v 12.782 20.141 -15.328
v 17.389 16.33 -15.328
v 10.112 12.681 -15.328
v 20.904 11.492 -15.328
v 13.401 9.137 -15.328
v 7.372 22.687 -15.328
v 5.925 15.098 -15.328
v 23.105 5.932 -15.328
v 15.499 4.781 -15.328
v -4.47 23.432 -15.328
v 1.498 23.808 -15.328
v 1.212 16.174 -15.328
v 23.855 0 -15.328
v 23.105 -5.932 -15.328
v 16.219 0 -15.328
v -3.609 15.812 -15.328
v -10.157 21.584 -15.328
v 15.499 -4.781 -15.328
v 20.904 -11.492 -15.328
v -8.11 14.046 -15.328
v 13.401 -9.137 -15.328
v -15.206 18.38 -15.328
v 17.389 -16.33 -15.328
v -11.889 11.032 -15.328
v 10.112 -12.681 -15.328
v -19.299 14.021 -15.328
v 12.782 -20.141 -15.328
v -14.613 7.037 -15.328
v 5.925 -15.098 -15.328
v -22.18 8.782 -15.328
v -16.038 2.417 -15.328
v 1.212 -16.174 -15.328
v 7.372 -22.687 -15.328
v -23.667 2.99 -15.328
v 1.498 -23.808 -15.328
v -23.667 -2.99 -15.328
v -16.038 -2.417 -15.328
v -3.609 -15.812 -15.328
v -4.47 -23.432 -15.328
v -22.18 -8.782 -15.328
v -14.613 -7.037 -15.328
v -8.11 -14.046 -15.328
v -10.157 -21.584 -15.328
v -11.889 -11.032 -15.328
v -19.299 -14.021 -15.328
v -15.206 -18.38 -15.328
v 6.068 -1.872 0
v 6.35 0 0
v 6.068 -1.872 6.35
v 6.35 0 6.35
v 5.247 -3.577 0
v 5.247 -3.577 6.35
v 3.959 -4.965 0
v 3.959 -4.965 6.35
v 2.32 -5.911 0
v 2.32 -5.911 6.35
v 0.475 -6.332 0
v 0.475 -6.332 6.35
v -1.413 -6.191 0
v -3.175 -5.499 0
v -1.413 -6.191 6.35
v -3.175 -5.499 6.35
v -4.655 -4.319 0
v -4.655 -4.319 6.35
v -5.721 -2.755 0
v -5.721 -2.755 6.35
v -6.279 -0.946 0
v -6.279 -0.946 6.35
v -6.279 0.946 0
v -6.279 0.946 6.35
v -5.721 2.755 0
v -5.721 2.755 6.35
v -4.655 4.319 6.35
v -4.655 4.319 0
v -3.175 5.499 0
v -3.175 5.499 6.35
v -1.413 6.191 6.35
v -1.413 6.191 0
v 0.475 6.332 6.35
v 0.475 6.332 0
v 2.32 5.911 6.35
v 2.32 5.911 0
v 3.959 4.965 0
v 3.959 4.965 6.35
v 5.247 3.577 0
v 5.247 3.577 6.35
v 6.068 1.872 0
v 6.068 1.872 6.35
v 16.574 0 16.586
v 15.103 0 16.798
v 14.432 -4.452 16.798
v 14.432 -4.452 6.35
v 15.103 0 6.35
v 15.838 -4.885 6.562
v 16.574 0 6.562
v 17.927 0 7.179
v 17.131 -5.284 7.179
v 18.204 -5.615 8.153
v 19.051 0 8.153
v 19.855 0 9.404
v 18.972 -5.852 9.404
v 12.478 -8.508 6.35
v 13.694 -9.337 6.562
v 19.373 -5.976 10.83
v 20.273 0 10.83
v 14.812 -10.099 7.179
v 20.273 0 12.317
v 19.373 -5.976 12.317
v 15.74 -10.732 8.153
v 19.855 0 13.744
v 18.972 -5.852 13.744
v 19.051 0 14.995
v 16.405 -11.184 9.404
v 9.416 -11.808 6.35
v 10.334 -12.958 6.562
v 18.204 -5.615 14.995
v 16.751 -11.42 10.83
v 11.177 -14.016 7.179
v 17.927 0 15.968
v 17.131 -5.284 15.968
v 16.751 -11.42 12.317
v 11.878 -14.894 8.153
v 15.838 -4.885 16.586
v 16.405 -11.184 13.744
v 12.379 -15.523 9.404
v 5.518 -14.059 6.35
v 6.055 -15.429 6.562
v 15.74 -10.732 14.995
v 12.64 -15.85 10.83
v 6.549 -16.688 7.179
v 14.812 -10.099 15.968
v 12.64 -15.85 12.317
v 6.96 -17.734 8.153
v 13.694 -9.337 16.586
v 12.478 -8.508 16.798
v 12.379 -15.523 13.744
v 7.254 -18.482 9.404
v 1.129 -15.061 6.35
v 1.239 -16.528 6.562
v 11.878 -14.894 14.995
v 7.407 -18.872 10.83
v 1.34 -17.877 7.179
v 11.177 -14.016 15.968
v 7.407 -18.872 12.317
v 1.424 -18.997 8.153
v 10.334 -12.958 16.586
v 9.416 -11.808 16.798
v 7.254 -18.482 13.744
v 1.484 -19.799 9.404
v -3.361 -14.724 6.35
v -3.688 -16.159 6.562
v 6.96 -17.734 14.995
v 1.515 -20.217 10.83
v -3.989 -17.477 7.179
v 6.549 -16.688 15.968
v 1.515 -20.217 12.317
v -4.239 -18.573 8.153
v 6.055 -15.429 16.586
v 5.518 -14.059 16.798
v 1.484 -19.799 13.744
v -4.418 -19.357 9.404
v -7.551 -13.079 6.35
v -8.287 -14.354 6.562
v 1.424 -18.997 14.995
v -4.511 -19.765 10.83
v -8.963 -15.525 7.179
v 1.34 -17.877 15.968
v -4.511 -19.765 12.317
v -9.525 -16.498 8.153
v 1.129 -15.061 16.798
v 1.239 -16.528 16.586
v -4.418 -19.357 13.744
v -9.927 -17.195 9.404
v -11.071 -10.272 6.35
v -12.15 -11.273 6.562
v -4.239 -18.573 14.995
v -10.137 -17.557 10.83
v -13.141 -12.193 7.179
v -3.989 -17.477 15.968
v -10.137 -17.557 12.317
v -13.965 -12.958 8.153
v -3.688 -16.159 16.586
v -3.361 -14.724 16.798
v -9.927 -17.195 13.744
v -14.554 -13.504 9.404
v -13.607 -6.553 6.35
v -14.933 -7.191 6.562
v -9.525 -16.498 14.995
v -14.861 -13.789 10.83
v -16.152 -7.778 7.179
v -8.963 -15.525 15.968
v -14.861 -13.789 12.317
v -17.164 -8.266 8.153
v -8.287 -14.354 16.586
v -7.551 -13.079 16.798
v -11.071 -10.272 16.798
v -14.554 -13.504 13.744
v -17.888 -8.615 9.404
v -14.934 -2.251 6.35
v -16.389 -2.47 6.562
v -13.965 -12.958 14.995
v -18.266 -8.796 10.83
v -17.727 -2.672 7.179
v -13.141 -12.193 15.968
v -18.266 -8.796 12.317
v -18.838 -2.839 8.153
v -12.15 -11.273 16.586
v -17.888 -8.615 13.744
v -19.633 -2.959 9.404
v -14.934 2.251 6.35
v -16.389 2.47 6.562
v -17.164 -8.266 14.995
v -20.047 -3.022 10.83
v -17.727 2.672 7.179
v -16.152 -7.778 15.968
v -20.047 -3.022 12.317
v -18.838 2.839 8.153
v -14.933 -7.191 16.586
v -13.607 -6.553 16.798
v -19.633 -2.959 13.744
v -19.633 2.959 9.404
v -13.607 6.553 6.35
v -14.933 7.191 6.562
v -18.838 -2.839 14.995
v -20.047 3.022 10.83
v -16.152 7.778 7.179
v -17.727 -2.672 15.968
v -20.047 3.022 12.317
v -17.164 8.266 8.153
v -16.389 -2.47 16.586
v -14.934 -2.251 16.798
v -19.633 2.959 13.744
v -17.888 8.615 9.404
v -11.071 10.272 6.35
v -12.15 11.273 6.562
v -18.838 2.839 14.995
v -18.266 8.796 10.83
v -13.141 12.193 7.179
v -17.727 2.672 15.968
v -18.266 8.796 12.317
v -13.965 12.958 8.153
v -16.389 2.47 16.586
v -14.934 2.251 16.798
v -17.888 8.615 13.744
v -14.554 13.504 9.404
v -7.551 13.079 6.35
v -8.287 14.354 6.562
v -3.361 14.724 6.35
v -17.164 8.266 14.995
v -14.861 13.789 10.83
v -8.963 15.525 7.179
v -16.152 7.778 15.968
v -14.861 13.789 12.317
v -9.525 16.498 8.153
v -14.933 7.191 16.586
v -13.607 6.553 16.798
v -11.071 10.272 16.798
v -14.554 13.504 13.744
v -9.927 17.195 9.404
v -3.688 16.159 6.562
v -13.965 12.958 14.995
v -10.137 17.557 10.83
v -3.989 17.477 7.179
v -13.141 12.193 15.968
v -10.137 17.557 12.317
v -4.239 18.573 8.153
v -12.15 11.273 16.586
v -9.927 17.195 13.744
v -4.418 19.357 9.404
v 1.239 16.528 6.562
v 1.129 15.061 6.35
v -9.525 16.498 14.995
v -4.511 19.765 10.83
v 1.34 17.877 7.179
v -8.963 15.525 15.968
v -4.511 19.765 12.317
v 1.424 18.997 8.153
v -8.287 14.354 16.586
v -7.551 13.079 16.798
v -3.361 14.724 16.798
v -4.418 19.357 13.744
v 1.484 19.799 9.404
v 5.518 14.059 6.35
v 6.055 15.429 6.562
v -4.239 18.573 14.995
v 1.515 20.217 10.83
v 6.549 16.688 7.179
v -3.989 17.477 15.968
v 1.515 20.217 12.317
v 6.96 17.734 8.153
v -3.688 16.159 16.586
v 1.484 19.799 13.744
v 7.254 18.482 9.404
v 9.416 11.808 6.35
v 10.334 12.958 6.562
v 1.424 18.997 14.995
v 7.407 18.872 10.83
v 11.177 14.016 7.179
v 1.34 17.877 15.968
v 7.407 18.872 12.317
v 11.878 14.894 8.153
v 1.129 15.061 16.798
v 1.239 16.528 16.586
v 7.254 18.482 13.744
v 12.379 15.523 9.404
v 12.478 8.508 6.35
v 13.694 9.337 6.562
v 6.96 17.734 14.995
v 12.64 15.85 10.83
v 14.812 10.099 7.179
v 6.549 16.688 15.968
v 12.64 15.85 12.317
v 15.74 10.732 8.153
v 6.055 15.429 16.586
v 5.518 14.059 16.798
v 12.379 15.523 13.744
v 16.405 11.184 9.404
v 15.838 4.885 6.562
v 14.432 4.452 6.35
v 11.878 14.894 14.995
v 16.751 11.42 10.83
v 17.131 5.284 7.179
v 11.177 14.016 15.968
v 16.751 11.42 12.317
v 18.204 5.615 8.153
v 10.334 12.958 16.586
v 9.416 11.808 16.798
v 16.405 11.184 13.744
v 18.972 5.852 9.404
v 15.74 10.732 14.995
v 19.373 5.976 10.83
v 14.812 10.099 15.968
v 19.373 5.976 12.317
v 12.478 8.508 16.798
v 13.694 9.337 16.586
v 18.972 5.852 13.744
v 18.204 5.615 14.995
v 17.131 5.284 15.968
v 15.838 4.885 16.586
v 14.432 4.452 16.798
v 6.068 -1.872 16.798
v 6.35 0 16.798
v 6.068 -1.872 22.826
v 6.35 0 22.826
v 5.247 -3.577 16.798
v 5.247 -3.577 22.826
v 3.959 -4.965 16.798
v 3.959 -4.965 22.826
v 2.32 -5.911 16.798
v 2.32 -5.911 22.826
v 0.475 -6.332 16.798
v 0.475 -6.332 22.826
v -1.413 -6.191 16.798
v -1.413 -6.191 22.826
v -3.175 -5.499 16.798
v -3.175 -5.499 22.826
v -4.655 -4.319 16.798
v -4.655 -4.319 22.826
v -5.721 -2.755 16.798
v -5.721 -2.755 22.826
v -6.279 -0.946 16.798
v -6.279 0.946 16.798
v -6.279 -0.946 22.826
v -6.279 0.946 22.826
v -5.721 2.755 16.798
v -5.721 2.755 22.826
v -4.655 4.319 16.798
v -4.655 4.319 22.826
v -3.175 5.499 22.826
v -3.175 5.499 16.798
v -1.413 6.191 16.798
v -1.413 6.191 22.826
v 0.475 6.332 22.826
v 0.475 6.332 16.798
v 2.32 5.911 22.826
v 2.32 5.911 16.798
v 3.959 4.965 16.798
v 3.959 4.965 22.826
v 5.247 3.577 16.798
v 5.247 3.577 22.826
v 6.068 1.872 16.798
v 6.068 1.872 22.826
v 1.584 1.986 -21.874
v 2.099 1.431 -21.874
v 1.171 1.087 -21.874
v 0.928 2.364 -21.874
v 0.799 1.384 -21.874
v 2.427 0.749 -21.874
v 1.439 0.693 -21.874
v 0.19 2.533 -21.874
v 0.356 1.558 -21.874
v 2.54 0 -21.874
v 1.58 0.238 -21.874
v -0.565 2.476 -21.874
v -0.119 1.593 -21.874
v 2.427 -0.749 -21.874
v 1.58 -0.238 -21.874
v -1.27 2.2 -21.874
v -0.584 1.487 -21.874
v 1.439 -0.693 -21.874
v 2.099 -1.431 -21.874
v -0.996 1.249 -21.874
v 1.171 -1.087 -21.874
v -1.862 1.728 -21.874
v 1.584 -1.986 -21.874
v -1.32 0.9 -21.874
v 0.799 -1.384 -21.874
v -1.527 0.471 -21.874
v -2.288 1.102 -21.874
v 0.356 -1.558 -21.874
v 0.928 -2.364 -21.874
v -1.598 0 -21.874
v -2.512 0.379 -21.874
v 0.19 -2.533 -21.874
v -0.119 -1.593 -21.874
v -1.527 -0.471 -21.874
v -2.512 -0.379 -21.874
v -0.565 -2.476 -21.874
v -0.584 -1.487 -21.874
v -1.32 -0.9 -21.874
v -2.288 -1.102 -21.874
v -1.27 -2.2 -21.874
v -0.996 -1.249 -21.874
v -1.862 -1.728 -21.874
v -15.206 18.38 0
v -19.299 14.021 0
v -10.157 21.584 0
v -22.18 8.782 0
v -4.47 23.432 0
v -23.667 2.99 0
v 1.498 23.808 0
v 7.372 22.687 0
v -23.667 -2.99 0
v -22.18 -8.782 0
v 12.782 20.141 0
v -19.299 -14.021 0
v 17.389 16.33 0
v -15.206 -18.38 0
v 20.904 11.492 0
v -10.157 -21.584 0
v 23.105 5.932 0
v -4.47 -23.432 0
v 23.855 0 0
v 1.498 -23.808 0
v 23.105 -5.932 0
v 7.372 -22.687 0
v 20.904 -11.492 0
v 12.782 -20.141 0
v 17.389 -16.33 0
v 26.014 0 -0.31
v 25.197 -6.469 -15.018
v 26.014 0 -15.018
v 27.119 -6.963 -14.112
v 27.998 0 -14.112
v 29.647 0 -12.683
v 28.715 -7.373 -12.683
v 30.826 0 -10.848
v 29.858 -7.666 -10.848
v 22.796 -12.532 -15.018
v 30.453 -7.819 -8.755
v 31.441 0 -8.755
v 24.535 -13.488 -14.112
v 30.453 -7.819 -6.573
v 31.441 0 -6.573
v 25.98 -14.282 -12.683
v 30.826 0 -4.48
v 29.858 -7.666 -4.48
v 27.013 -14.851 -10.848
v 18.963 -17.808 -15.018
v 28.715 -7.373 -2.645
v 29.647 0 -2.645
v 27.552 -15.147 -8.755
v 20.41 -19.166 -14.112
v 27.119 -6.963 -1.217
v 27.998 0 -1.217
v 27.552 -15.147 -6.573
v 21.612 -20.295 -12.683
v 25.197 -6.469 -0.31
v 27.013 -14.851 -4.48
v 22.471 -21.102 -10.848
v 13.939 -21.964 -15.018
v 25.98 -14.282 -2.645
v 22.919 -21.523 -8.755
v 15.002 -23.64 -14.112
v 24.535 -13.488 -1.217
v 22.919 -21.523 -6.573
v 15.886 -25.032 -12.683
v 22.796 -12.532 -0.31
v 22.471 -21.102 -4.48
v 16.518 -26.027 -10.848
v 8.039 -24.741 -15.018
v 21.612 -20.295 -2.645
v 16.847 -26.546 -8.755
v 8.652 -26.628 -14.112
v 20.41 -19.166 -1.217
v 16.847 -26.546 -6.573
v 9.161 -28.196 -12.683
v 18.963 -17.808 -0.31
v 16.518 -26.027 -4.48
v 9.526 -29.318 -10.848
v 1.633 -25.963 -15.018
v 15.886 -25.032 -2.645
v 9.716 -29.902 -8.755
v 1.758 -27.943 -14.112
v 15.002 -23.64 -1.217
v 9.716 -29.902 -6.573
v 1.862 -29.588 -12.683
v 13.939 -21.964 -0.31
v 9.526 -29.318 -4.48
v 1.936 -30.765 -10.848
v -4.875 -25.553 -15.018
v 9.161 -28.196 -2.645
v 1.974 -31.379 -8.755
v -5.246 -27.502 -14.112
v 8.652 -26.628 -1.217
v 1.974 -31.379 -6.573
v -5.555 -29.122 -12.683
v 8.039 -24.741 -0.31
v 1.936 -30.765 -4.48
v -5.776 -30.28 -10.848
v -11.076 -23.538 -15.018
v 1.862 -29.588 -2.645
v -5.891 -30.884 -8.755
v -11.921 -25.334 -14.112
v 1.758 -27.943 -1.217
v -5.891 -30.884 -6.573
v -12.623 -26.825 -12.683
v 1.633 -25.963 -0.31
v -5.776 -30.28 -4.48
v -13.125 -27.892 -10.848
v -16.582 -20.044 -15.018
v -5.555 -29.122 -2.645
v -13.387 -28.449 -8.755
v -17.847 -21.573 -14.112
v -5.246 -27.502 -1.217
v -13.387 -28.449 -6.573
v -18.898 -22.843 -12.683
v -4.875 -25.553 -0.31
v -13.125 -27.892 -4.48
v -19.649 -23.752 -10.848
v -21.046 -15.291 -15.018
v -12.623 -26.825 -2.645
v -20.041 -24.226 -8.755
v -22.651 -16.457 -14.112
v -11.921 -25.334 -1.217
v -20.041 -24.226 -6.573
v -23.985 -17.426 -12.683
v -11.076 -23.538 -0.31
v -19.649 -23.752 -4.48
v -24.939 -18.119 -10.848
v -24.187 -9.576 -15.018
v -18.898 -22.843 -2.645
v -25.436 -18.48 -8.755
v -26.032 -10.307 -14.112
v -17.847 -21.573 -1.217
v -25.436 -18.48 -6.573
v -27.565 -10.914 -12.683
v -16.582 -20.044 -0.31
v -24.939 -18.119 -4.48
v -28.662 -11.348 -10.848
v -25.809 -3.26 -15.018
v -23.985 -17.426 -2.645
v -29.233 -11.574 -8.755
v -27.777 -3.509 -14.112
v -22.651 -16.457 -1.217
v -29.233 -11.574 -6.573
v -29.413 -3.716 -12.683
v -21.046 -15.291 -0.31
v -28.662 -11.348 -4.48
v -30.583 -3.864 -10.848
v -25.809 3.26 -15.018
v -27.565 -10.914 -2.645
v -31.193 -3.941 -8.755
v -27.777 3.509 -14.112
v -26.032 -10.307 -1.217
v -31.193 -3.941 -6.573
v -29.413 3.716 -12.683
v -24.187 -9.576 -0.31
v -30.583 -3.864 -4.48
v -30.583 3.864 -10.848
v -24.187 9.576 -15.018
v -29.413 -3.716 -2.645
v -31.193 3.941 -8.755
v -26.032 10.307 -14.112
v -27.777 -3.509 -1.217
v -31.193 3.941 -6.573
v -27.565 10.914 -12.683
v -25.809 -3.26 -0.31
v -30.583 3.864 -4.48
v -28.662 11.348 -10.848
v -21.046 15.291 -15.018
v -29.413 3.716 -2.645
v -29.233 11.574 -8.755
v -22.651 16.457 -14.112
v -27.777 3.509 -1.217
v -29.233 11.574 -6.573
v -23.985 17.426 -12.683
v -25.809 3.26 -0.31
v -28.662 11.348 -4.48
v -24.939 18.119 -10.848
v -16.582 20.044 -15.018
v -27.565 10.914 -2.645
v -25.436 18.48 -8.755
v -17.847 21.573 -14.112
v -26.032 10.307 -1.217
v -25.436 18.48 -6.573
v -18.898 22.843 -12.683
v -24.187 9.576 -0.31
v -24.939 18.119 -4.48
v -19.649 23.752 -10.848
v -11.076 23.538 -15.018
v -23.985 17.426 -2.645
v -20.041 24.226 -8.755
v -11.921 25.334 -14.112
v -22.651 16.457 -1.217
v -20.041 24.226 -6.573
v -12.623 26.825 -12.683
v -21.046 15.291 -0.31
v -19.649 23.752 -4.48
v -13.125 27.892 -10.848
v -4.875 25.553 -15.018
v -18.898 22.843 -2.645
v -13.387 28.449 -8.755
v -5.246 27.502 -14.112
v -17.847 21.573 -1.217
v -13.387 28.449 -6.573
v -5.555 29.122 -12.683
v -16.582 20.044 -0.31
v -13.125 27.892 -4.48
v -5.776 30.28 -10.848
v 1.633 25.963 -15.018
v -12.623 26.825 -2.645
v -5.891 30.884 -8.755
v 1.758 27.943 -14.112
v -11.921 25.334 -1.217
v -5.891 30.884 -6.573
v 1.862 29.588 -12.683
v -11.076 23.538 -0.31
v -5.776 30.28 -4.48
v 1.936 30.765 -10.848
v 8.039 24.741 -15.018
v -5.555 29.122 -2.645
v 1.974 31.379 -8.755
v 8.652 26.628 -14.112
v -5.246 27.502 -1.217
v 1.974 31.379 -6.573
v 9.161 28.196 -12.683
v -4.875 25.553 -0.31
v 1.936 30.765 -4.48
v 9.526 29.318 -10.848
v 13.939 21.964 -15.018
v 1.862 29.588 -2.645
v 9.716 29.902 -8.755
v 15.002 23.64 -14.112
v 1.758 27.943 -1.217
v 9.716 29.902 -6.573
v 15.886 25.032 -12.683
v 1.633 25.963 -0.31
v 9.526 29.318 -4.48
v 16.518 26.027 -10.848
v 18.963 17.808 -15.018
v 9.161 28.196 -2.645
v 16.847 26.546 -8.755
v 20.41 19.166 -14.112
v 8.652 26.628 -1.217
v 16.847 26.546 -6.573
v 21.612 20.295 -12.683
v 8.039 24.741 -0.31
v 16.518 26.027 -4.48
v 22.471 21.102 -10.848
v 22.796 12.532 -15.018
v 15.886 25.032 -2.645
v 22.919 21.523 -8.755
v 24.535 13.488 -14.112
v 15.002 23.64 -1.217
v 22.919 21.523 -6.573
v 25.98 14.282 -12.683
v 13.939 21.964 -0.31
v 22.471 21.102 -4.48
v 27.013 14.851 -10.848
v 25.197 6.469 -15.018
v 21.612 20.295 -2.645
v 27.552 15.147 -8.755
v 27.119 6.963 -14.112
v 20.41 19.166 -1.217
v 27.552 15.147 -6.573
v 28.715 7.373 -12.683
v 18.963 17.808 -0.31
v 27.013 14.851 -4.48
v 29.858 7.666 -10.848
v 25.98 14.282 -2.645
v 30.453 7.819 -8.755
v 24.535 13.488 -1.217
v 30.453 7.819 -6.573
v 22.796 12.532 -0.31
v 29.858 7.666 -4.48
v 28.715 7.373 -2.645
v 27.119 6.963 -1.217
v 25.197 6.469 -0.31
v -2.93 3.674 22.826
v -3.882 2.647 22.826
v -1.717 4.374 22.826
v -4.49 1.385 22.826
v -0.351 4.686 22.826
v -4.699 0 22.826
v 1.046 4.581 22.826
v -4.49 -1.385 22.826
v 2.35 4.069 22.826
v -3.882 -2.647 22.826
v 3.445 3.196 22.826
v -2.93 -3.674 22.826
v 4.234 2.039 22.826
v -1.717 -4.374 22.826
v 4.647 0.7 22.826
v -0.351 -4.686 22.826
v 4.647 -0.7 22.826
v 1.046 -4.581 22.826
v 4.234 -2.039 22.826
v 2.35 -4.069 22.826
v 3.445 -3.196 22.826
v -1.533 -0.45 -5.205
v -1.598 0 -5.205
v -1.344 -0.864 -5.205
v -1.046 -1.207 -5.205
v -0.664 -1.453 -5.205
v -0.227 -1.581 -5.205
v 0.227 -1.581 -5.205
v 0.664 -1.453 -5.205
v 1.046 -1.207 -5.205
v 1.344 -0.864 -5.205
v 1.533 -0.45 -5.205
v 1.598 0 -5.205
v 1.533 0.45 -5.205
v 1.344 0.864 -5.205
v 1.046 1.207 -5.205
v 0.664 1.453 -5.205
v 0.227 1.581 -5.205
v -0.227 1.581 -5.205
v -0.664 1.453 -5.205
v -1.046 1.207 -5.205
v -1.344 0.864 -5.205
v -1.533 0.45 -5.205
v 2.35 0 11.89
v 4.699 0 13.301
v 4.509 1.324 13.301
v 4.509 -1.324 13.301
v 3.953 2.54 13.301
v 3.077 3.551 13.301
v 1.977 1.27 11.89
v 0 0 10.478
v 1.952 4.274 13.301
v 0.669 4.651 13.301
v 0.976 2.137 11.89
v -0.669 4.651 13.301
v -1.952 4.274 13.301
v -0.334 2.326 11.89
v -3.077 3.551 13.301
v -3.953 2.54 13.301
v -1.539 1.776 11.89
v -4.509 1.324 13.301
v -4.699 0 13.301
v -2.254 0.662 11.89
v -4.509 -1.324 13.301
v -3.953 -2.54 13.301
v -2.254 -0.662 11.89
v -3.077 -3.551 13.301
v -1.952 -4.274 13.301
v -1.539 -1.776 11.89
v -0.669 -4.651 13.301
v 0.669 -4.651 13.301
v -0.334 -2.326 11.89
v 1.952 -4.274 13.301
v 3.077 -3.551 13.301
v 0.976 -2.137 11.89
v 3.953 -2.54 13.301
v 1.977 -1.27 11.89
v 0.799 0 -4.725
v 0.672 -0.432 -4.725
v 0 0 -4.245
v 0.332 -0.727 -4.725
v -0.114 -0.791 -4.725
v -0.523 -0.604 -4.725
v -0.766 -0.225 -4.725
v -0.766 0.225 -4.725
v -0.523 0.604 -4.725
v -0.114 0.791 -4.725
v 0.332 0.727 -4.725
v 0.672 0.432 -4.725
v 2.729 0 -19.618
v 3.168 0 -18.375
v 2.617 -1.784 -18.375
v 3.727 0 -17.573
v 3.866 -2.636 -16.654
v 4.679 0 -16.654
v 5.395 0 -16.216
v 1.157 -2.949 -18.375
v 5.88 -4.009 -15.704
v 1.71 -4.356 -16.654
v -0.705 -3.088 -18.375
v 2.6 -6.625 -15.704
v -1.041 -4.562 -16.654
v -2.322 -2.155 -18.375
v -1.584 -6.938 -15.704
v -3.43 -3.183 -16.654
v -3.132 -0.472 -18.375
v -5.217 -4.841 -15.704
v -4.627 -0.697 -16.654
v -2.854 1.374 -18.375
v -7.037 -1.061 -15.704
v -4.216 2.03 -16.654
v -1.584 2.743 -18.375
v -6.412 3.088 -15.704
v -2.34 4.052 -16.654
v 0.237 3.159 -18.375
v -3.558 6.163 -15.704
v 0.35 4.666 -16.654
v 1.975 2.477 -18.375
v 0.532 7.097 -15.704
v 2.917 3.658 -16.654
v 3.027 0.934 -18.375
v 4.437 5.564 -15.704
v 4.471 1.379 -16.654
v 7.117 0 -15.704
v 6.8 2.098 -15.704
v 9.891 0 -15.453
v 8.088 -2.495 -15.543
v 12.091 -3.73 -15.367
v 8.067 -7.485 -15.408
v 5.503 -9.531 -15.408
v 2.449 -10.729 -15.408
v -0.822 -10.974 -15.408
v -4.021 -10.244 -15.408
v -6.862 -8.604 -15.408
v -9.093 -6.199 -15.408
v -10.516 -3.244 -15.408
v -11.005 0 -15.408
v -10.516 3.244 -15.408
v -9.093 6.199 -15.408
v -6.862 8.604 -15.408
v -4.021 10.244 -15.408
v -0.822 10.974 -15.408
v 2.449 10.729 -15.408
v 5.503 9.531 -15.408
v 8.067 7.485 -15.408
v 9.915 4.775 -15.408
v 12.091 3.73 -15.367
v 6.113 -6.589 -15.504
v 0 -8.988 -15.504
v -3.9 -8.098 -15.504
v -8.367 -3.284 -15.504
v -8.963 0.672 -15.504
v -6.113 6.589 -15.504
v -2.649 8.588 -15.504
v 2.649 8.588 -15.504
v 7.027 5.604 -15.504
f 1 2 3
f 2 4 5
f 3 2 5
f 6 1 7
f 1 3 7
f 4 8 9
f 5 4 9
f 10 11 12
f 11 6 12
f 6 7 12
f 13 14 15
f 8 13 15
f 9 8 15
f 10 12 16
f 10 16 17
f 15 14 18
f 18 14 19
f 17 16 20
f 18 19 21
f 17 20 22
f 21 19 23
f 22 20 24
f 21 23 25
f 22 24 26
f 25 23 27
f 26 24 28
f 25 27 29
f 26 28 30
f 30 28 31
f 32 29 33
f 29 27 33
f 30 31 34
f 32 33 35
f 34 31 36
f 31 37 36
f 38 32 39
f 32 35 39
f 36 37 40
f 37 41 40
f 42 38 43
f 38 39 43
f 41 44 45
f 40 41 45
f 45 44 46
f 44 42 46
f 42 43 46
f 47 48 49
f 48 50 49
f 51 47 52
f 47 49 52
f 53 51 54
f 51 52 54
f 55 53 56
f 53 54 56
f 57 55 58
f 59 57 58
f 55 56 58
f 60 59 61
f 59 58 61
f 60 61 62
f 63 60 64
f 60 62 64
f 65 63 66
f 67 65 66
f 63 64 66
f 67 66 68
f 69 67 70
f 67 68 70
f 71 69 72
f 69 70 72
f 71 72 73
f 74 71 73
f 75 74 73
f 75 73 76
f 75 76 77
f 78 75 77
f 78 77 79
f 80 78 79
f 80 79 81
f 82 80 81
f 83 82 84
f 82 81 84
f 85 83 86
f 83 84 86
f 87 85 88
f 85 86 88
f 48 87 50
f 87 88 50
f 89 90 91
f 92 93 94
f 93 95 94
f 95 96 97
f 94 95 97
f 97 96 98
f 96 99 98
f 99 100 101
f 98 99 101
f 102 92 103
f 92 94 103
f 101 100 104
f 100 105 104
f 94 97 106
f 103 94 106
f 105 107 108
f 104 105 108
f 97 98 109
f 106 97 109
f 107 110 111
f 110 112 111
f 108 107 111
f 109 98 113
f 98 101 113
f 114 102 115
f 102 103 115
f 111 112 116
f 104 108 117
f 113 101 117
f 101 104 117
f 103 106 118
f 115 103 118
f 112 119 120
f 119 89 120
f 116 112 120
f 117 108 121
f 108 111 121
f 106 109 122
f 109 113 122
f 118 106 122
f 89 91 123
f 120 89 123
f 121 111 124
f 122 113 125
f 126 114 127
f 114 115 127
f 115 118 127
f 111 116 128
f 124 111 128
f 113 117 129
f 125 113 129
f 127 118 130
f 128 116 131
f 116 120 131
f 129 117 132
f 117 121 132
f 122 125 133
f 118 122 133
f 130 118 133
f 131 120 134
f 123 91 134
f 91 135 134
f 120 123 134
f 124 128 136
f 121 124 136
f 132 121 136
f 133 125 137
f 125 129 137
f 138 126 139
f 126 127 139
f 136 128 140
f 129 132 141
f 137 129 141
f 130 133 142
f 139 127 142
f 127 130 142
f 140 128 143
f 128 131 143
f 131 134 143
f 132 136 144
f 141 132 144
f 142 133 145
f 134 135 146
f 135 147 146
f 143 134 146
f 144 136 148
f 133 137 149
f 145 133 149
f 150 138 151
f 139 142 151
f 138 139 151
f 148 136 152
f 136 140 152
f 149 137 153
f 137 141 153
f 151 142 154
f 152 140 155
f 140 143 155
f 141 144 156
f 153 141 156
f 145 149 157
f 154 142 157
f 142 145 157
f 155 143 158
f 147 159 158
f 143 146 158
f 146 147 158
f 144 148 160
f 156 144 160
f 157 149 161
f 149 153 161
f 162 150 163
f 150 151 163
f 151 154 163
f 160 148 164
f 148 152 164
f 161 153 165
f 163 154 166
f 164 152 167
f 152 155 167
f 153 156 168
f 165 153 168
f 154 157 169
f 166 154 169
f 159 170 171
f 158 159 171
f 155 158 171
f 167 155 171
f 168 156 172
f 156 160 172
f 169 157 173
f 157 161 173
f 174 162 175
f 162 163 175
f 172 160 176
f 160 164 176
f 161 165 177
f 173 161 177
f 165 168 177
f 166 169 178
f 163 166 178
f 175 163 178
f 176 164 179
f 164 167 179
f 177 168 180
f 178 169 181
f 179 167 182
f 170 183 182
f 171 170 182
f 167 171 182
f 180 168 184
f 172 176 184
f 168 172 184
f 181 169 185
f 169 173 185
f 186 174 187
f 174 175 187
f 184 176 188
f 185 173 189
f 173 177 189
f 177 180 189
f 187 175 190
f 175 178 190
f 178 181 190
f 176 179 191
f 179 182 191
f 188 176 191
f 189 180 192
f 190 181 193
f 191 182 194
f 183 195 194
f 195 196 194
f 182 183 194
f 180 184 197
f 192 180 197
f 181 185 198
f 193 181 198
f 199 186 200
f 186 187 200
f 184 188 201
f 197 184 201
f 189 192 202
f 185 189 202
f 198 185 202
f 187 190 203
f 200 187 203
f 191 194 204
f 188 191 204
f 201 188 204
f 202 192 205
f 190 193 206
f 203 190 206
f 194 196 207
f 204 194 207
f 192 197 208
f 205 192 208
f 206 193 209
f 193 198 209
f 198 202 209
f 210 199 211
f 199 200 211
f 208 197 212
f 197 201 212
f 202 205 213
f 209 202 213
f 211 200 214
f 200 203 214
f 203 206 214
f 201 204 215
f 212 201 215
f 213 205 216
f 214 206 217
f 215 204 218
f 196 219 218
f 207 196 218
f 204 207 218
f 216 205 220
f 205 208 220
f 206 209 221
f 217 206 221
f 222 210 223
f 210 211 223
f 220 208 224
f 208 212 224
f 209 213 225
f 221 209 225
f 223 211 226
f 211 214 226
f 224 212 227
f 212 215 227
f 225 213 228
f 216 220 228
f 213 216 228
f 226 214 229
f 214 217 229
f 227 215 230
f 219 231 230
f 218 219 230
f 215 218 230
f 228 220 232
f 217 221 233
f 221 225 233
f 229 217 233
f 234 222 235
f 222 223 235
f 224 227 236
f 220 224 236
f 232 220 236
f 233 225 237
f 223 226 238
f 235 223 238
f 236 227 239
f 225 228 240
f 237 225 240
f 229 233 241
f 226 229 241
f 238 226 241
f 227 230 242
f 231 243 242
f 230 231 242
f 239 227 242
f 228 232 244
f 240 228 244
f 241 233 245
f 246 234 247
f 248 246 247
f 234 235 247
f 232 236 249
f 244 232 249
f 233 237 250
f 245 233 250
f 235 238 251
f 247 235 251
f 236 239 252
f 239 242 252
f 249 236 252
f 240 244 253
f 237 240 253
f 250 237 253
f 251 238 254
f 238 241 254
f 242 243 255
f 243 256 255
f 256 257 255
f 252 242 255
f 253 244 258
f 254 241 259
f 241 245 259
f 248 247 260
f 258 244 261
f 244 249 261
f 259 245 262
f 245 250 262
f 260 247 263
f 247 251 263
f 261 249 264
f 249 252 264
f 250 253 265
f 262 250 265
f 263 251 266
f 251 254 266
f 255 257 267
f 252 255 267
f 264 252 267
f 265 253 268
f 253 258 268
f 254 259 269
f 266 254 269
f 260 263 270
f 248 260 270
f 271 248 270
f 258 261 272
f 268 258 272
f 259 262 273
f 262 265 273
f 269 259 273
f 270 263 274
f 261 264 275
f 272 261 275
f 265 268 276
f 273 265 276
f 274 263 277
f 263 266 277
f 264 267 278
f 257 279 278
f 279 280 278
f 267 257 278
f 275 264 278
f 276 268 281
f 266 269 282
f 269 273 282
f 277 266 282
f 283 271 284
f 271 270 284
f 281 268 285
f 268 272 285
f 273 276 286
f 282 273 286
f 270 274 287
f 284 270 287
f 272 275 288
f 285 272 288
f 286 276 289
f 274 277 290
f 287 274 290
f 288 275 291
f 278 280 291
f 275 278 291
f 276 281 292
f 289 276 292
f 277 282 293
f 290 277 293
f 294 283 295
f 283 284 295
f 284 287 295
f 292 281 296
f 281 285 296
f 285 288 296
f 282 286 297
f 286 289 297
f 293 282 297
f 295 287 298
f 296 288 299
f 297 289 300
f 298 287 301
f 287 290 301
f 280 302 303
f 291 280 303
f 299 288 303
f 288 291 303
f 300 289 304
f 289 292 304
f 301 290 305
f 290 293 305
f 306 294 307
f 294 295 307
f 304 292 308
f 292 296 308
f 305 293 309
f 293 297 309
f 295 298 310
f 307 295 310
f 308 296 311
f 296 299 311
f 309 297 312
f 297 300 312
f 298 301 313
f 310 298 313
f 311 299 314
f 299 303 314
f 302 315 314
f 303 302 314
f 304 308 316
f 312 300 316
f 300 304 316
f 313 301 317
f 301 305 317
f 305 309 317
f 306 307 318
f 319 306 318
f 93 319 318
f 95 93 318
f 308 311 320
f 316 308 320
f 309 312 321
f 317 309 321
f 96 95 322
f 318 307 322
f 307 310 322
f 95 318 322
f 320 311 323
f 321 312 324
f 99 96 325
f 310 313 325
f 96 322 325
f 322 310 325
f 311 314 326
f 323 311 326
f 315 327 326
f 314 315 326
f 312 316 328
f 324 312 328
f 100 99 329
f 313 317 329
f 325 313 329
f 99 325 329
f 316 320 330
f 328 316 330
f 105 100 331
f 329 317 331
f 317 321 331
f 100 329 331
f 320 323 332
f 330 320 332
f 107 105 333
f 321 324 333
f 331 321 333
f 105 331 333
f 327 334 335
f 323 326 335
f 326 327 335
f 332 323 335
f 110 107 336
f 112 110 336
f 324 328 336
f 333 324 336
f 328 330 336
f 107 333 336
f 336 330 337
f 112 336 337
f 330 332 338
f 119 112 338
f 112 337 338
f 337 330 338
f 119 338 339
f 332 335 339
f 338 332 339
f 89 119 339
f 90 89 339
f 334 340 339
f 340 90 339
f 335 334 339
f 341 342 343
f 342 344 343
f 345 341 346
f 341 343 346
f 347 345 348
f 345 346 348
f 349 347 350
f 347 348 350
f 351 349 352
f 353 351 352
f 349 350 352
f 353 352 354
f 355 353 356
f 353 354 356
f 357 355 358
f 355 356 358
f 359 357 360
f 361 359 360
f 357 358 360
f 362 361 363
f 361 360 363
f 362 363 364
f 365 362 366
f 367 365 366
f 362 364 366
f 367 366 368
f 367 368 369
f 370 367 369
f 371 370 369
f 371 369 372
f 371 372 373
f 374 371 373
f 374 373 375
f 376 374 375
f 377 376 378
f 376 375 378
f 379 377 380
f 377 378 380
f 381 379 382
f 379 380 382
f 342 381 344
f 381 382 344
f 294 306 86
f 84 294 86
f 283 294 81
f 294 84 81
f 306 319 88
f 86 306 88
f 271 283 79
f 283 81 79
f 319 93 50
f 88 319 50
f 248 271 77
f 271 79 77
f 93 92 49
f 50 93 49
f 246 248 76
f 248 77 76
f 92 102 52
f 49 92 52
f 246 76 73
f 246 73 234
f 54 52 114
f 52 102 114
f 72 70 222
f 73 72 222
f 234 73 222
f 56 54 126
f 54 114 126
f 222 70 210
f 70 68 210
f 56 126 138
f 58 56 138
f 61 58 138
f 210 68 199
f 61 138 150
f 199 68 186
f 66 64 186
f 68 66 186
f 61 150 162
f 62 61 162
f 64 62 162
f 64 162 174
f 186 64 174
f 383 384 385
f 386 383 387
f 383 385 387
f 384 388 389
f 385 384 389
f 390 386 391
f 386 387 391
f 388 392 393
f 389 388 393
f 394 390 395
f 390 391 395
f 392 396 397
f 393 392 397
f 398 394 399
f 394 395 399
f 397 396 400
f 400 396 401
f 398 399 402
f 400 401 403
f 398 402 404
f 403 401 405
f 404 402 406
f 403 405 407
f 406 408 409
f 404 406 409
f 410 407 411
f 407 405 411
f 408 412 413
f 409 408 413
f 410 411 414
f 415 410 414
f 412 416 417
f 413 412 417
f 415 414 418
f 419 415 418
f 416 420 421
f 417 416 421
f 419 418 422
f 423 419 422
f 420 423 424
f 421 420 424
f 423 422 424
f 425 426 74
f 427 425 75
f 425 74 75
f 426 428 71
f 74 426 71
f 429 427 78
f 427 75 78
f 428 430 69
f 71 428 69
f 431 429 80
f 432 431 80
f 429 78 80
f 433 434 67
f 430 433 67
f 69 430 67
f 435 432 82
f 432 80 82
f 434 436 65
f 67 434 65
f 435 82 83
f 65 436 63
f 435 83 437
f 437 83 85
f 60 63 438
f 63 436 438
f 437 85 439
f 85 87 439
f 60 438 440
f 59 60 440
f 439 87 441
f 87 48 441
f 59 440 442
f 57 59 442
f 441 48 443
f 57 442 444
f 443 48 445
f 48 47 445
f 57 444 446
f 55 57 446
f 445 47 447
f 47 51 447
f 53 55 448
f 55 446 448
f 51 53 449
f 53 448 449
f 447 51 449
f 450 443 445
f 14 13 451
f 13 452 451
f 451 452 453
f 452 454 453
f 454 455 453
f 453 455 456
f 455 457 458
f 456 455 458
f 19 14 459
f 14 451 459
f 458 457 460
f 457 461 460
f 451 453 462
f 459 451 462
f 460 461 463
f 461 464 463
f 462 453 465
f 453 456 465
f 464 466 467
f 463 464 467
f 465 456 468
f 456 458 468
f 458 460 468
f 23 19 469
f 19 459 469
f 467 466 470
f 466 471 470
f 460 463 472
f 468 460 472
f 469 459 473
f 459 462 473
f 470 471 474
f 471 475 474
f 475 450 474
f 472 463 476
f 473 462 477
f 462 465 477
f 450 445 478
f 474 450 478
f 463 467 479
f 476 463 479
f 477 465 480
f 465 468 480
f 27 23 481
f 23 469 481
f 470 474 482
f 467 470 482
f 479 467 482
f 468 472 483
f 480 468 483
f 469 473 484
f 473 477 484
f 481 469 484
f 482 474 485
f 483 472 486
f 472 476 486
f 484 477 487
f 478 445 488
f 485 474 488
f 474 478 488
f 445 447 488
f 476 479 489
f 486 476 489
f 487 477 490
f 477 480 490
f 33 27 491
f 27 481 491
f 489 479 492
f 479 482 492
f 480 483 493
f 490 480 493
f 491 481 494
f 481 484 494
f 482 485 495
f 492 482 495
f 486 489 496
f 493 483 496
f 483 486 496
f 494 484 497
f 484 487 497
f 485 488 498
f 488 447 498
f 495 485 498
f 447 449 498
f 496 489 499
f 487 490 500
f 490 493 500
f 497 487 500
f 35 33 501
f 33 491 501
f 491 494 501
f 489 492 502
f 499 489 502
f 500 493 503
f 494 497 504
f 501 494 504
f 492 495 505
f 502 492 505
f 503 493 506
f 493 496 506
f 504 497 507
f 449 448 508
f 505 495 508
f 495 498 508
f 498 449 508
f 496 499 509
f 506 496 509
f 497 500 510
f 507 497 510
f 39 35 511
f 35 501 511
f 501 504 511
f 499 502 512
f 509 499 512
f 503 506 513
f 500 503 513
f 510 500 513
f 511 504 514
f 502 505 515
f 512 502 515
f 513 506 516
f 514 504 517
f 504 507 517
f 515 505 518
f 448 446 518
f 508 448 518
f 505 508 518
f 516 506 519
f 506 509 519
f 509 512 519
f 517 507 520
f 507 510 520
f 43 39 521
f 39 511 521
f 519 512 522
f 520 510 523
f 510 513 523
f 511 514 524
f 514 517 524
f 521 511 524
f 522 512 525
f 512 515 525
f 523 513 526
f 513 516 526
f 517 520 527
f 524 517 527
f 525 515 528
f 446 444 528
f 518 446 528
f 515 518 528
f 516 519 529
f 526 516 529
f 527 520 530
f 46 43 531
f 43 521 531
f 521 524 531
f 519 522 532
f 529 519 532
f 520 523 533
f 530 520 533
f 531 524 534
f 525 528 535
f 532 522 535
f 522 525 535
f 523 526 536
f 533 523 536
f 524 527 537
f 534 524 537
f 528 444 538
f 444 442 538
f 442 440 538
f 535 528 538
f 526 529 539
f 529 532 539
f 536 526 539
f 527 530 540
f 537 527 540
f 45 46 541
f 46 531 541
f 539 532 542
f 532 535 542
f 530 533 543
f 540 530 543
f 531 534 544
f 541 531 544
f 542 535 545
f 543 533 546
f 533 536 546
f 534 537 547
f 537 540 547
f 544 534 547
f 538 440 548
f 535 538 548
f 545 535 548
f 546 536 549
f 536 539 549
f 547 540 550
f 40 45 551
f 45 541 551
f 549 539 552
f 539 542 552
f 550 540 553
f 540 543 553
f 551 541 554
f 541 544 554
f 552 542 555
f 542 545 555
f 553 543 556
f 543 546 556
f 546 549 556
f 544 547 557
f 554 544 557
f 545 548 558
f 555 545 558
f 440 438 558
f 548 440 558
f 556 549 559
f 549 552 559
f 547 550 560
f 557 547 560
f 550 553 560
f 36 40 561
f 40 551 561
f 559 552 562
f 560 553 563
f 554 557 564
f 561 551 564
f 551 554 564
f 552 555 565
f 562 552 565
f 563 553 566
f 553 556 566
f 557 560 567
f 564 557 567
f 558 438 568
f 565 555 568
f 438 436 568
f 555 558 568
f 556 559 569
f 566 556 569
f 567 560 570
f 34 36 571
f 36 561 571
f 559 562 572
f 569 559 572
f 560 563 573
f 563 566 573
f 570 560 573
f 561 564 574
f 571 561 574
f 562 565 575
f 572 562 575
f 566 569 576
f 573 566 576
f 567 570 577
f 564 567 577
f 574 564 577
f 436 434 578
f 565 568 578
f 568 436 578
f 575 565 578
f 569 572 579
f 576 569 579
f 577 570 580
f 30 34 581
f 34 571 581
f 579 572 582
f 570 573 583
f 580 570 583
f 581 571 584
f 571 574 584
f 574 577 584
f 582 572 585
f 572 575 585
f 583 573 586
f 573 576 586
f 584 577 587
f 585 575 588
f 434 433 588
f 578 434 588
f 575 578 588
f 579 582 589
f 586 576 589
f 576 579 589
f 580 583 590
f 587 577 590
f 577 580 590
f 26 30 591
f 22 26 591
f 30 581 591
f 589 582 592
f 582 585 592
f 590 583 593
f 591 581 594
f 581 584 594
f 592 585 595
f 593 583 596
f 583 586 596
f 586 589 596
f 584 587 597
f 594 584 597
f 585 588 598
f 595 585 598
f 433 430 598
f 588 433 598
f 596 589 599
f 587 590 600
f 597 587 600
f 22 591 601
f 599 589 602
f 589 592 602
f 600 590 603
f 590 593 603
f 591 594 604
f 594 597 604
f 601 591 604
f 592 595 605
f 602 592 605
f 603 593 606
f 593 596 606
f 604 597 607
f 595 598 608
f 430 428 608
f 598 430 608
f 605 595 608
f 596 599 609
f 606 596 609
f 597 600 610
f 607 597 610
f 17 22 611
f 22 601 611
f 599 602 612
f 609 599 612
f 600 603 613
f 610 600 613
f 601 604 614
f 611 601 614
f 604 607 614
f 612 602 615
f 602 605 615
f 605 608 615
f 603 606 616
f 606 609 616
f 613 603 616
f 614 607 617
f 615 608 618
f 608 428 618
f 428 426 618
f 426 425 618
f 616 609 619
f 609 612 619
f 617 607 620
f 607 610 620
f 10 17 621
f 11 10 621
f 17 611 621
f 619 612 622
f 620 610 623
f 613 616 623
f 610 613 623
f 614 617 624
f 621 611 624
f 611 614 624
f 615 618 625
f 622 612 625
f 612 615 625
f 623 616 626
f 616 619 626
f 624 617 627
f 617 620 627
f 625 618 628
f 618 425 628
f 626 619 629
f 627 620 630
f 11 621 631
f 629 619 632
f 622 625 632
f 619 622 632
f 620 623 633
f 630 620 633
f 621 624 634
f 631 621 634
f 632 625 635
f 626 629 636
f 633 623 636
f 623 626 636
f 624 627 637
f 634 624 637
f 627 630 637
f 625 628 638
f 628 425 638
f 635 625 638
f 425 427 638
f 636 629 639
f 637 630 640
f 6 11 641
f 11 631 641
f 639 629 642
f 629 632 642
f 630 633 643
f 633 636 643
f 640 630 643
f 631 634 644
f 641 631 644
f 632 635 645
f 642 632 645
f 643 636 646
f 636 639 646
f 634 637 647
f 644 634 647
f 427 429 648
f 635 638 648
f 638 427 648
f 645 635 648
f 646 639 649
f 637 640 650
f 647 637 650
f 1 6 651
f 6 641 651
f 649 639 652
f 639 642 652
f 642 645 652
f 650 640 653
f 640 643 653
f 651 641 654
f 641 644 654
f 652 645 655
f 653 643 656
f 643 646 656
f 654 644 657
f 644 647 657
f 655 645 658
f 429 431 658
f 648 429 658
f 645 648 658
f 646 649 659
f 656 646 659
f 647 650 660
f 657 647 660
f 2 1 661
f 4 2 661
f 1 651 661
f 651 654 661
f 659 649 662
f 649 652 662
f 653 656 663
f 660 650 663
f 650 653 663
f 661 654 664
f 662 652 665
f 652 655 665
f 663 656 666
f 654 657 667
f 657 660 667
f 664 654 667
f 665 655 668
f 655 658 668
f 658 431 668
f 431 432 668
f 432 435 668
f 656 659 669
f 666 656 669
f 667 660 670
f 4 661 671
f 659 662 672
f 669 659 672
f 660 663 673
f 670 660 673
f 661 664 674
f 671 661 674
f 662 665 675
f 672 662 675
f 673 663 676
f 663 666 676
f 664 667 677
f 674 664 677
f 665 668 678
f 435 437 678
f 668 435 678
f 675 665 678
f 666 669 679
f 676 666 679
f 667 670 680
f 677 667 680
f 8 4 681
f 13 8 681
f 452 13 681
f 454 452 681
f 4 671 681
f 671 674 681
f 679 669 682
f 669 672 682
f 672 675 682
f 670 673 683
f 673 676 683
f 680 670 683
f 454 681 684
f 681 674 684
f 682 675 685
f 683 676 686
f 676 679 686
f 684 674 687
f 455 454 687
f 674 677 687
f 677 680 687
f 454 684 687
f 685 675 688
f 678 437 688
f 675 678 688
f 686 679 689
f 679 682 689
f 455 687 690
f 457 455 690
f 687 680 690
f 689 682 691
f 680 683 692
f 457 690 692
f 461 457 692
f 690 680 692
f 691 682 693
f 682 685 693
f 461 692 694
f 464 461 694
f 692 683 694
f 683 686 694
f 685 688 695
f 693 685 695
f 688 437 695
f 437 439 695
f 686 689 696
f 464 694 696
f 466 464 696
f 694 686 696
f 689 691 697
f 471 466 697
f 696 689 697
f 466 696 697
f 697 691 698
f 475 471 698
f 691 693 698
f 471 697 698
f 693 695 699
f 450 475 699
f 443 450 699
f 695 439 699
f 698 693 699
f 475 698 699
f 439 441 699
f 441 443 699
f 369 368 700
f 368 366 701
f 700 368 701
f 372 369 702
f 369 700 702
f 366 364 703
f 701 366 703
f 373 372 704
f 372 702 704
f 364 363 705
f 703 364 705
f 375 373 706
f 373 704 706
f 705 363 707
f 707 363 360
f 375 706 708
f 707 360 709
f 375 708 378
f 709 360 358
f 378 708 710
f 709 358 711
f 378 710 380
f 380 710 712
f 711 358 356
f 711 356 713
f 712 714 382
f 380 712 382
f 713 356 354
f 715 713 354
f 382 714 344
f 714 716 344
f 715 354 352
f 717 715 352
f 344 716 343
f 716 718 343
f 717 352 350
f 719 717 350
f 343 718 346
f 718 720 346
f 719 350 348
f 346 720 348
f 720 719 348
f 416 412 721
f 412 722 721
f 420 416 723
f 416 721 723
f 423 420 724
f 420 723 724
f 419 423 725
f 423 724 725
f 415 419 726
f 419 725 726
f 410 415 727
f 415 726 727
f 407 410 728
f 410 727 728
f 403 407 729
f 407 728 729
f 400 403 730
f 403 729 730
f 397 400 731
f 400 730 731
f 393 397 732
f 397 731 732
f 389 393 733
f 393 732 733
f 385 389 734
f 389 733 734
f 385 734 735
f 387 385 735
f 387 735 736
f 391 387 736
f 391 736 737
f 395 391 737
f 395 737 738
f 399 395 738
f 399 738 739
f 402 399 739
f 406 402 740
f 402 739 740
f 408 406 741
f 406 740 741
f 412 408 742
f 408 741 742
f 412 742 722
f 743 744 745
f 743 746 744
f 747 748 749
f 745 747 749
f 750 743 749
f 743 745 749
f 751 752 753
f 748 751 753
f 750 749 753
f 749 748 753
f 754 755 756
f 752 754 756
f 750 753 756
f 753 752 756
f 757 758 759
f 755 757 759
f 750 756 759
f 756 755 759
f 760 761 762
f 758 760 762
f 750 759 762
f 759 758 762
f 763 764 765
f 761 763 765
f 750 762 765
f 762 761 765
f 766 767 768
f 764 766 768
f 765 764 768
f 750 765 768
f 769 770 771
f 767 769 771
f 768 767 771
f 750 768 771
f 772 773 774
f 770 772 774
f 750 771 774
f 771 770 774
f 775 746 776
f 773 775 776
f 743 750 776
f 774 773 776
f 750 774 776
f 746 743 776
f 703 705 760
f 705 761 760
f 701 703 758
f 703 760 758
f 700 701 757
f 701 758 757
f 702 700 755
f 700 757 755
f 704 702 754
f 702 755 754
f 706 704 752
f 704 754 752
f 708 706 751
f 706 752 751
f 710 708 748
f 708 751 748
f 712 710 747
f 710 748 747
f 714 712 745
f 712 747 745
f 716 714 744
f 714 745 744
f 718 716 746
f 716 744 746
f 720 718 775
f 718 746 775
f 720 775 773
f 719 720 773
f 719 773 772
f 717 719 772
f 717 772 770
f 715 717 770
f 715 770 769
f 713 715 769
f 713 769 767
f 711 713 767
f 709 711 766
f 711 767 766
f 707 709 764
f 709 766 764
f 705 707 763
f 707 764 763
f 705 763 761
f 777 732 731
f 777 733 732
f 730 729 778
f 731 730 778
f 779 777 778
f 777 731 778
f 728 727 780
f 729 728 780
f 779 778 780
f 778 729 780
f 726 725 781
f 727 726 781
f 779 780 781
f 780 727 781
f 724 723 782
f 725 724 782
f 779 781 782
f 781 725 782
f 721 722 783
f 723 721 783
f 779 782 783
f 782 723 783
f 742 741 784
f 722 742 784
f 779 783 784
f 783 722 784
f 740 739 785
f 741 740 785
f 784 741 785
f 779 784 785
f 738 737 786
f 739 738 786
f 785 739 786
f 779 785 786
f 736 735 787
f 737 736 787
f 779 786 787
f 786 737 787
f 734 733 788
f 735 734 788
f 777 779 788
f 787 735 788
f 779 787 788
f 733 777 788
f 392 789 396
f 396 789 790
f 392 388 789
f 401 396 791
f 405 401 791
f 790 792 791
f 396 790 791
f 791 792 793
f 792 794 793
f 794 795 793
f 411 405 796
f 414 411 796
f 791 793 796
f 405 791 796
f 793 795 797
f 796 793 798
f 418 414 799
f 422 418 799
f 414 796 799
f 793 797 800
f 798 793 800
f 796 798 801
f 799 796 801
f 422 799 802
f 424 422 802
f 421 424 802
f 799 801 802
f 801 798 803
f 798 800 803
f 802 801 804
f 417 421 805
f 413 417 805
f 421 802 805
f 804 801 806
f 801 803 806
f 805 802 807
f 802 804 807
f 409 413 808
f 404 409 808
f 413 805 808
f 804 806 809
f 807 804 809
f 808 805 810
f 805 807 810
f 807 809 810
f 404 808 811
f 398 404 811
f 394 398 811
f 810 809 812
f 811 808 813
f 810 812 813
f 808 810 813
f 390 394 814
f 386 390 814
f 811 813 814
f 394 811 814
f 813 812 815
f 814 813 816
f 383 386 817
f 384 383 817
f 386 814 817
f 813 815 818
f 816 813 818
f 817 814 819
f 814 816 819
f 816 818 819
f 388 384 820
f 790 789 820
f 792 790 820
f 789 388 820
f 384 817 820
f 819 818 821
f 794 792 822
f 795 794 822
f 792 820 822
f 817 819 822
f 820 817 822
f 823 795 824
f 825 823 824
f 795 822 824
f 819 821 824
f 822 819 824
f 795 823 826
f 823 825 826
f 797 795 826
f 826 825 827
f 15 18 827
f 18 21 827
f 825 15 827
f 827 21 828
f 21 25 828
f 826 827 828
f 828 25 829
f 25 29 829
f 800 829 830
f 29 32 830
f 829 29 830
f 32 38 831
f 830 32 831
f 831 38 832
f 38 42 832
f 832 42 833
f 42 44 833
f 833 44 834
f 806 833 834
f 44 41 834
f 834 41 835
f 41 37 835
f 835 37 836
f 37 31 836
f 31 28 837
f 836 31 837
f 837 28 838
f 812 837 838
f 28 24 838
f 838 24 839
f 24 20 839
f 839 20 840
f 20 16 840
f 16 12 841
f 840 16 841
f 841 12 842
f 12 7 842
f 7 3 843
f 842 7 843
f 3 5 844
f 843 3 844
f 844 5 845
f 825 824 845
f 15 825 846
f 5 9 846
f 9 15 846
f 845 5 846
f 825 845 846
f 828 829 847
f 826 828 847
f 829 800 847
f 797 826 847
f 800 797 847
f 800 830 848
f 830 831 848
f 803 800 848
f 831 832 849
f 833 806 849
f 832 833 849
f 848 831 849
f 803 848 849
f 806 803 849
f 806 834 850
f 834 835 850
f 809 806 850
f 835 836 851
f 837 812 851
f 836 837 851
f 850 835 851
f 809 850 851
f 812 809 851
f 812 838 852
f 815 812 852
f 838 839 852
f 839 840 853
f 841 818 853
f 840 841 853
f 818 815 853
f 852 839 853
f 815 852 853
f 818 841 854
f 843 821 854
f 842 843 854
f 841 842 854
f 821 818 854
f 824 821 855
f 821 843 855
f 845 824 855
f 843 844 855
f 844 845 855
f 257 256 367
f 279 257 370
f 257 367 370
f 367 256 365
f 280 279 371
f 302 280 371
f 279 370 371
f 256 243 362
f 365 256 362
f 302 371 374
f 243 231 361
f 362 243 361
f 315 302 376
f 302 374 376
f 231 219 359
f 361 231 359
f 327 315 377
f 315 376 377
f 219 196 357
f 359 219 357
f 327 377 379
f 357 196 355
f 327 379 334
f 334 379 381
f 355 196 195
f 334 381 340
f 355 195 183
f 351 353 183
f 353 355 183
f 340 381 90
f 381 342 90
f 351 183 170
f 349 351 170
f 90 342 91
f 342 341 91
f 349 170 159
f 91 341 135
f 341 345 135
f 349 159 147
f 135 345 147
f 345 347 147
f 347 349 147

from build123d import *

# Parameters (mm, degrees)
F3_D     = 9.398
F3_DEPTH = 9.525
F3_TIP   = 2.8234440488
F5_D     = 3.19532
F5_DEPTH = 16.66875
F5_TIP   = 0.9599709766


with BuildPart() as f1:
    # F0 (on Front) → F1 (revolve)
    with BuildSketch(Plane.XZ):
        with BuildLine():
            Line((0, 22.8263996542), (0, -21.8741521218))
            Line((0, -21.8741521218), (2.54, -21.8741521218))
            add(Edge.make_bspline(
                [(2.54, -21.8741521218), (2.5441716884, -19.3644294307), (3.3400128786, -17.8042466392), (5.4864982158, -15.8082274963), (9.6622245064, -15.3927278895), (13.0963800475, -15.3518803418), (16.2190684, -15.3281874955)],
                knots=[0, 0, 0, 0, 0.2538500708, 0.4431641951, 0.6786842586, 1, 1, 1, 1], degree=3))
            Line((16.2190684, -15.3281874955), (23.8547402, -15.3281874955))
            ThreePointArc((23.8547402, -15.3281874955), (31.5188339477, -7.6640937477), (23.8547402, 0))
            Line((23.8547402, 0), (6.35, 0))
            Line((6.35, 0), (6.35, 6.35))
            Line((6.35, 6.35), (15.1027384, 6.35))
            ThreePointArc((15.1027384, 6.35), (20.3265735139, 11.5738351139), (15.1027384, 16.7976702278))
            Line((15.1027384, 16.7976702278), (6.35, 16.7976702278))
            Line((6.35, 16.7976702278), (6.35, 22.8263996542))
            Line((6.35, 22.8263996542), (0, 22.8263996542))
        make_face()
    revolve(axis=Axis((0, 0, 0.4761237662), (0, 0, -1)))

    # F3
    with Locations(Plane.XY.offset(22.8263996542)):
        with Locations((0, 0)):
            Hole(F3_D / 2, depth=F3_DEPTH)
            with Locations((0, 0, -(F3_DEPTH + F3_TIP / 2))):  # 118° drill point
                Cone(0, F3_D / 2, F3_TIP, mode=Mode.SUBTRACT)

    # F5
    with Locations(Plane(origin=(0, 0, -21.8741521218), x_dir=(1, 0, 0), z_dir=(0, 0, -1))):
        with Locations((0, 0)):
            Hole(F5_D / 2, depth=F5_DEPTH)
            with Locations((0, 0, -(F5_DEPTH + F5_TIP / 2))):  # 118° drill point
                Cone(0, F5_D / 2, F5_TIP, mode=Mode.SUBTRACT)


solid = f1.part
